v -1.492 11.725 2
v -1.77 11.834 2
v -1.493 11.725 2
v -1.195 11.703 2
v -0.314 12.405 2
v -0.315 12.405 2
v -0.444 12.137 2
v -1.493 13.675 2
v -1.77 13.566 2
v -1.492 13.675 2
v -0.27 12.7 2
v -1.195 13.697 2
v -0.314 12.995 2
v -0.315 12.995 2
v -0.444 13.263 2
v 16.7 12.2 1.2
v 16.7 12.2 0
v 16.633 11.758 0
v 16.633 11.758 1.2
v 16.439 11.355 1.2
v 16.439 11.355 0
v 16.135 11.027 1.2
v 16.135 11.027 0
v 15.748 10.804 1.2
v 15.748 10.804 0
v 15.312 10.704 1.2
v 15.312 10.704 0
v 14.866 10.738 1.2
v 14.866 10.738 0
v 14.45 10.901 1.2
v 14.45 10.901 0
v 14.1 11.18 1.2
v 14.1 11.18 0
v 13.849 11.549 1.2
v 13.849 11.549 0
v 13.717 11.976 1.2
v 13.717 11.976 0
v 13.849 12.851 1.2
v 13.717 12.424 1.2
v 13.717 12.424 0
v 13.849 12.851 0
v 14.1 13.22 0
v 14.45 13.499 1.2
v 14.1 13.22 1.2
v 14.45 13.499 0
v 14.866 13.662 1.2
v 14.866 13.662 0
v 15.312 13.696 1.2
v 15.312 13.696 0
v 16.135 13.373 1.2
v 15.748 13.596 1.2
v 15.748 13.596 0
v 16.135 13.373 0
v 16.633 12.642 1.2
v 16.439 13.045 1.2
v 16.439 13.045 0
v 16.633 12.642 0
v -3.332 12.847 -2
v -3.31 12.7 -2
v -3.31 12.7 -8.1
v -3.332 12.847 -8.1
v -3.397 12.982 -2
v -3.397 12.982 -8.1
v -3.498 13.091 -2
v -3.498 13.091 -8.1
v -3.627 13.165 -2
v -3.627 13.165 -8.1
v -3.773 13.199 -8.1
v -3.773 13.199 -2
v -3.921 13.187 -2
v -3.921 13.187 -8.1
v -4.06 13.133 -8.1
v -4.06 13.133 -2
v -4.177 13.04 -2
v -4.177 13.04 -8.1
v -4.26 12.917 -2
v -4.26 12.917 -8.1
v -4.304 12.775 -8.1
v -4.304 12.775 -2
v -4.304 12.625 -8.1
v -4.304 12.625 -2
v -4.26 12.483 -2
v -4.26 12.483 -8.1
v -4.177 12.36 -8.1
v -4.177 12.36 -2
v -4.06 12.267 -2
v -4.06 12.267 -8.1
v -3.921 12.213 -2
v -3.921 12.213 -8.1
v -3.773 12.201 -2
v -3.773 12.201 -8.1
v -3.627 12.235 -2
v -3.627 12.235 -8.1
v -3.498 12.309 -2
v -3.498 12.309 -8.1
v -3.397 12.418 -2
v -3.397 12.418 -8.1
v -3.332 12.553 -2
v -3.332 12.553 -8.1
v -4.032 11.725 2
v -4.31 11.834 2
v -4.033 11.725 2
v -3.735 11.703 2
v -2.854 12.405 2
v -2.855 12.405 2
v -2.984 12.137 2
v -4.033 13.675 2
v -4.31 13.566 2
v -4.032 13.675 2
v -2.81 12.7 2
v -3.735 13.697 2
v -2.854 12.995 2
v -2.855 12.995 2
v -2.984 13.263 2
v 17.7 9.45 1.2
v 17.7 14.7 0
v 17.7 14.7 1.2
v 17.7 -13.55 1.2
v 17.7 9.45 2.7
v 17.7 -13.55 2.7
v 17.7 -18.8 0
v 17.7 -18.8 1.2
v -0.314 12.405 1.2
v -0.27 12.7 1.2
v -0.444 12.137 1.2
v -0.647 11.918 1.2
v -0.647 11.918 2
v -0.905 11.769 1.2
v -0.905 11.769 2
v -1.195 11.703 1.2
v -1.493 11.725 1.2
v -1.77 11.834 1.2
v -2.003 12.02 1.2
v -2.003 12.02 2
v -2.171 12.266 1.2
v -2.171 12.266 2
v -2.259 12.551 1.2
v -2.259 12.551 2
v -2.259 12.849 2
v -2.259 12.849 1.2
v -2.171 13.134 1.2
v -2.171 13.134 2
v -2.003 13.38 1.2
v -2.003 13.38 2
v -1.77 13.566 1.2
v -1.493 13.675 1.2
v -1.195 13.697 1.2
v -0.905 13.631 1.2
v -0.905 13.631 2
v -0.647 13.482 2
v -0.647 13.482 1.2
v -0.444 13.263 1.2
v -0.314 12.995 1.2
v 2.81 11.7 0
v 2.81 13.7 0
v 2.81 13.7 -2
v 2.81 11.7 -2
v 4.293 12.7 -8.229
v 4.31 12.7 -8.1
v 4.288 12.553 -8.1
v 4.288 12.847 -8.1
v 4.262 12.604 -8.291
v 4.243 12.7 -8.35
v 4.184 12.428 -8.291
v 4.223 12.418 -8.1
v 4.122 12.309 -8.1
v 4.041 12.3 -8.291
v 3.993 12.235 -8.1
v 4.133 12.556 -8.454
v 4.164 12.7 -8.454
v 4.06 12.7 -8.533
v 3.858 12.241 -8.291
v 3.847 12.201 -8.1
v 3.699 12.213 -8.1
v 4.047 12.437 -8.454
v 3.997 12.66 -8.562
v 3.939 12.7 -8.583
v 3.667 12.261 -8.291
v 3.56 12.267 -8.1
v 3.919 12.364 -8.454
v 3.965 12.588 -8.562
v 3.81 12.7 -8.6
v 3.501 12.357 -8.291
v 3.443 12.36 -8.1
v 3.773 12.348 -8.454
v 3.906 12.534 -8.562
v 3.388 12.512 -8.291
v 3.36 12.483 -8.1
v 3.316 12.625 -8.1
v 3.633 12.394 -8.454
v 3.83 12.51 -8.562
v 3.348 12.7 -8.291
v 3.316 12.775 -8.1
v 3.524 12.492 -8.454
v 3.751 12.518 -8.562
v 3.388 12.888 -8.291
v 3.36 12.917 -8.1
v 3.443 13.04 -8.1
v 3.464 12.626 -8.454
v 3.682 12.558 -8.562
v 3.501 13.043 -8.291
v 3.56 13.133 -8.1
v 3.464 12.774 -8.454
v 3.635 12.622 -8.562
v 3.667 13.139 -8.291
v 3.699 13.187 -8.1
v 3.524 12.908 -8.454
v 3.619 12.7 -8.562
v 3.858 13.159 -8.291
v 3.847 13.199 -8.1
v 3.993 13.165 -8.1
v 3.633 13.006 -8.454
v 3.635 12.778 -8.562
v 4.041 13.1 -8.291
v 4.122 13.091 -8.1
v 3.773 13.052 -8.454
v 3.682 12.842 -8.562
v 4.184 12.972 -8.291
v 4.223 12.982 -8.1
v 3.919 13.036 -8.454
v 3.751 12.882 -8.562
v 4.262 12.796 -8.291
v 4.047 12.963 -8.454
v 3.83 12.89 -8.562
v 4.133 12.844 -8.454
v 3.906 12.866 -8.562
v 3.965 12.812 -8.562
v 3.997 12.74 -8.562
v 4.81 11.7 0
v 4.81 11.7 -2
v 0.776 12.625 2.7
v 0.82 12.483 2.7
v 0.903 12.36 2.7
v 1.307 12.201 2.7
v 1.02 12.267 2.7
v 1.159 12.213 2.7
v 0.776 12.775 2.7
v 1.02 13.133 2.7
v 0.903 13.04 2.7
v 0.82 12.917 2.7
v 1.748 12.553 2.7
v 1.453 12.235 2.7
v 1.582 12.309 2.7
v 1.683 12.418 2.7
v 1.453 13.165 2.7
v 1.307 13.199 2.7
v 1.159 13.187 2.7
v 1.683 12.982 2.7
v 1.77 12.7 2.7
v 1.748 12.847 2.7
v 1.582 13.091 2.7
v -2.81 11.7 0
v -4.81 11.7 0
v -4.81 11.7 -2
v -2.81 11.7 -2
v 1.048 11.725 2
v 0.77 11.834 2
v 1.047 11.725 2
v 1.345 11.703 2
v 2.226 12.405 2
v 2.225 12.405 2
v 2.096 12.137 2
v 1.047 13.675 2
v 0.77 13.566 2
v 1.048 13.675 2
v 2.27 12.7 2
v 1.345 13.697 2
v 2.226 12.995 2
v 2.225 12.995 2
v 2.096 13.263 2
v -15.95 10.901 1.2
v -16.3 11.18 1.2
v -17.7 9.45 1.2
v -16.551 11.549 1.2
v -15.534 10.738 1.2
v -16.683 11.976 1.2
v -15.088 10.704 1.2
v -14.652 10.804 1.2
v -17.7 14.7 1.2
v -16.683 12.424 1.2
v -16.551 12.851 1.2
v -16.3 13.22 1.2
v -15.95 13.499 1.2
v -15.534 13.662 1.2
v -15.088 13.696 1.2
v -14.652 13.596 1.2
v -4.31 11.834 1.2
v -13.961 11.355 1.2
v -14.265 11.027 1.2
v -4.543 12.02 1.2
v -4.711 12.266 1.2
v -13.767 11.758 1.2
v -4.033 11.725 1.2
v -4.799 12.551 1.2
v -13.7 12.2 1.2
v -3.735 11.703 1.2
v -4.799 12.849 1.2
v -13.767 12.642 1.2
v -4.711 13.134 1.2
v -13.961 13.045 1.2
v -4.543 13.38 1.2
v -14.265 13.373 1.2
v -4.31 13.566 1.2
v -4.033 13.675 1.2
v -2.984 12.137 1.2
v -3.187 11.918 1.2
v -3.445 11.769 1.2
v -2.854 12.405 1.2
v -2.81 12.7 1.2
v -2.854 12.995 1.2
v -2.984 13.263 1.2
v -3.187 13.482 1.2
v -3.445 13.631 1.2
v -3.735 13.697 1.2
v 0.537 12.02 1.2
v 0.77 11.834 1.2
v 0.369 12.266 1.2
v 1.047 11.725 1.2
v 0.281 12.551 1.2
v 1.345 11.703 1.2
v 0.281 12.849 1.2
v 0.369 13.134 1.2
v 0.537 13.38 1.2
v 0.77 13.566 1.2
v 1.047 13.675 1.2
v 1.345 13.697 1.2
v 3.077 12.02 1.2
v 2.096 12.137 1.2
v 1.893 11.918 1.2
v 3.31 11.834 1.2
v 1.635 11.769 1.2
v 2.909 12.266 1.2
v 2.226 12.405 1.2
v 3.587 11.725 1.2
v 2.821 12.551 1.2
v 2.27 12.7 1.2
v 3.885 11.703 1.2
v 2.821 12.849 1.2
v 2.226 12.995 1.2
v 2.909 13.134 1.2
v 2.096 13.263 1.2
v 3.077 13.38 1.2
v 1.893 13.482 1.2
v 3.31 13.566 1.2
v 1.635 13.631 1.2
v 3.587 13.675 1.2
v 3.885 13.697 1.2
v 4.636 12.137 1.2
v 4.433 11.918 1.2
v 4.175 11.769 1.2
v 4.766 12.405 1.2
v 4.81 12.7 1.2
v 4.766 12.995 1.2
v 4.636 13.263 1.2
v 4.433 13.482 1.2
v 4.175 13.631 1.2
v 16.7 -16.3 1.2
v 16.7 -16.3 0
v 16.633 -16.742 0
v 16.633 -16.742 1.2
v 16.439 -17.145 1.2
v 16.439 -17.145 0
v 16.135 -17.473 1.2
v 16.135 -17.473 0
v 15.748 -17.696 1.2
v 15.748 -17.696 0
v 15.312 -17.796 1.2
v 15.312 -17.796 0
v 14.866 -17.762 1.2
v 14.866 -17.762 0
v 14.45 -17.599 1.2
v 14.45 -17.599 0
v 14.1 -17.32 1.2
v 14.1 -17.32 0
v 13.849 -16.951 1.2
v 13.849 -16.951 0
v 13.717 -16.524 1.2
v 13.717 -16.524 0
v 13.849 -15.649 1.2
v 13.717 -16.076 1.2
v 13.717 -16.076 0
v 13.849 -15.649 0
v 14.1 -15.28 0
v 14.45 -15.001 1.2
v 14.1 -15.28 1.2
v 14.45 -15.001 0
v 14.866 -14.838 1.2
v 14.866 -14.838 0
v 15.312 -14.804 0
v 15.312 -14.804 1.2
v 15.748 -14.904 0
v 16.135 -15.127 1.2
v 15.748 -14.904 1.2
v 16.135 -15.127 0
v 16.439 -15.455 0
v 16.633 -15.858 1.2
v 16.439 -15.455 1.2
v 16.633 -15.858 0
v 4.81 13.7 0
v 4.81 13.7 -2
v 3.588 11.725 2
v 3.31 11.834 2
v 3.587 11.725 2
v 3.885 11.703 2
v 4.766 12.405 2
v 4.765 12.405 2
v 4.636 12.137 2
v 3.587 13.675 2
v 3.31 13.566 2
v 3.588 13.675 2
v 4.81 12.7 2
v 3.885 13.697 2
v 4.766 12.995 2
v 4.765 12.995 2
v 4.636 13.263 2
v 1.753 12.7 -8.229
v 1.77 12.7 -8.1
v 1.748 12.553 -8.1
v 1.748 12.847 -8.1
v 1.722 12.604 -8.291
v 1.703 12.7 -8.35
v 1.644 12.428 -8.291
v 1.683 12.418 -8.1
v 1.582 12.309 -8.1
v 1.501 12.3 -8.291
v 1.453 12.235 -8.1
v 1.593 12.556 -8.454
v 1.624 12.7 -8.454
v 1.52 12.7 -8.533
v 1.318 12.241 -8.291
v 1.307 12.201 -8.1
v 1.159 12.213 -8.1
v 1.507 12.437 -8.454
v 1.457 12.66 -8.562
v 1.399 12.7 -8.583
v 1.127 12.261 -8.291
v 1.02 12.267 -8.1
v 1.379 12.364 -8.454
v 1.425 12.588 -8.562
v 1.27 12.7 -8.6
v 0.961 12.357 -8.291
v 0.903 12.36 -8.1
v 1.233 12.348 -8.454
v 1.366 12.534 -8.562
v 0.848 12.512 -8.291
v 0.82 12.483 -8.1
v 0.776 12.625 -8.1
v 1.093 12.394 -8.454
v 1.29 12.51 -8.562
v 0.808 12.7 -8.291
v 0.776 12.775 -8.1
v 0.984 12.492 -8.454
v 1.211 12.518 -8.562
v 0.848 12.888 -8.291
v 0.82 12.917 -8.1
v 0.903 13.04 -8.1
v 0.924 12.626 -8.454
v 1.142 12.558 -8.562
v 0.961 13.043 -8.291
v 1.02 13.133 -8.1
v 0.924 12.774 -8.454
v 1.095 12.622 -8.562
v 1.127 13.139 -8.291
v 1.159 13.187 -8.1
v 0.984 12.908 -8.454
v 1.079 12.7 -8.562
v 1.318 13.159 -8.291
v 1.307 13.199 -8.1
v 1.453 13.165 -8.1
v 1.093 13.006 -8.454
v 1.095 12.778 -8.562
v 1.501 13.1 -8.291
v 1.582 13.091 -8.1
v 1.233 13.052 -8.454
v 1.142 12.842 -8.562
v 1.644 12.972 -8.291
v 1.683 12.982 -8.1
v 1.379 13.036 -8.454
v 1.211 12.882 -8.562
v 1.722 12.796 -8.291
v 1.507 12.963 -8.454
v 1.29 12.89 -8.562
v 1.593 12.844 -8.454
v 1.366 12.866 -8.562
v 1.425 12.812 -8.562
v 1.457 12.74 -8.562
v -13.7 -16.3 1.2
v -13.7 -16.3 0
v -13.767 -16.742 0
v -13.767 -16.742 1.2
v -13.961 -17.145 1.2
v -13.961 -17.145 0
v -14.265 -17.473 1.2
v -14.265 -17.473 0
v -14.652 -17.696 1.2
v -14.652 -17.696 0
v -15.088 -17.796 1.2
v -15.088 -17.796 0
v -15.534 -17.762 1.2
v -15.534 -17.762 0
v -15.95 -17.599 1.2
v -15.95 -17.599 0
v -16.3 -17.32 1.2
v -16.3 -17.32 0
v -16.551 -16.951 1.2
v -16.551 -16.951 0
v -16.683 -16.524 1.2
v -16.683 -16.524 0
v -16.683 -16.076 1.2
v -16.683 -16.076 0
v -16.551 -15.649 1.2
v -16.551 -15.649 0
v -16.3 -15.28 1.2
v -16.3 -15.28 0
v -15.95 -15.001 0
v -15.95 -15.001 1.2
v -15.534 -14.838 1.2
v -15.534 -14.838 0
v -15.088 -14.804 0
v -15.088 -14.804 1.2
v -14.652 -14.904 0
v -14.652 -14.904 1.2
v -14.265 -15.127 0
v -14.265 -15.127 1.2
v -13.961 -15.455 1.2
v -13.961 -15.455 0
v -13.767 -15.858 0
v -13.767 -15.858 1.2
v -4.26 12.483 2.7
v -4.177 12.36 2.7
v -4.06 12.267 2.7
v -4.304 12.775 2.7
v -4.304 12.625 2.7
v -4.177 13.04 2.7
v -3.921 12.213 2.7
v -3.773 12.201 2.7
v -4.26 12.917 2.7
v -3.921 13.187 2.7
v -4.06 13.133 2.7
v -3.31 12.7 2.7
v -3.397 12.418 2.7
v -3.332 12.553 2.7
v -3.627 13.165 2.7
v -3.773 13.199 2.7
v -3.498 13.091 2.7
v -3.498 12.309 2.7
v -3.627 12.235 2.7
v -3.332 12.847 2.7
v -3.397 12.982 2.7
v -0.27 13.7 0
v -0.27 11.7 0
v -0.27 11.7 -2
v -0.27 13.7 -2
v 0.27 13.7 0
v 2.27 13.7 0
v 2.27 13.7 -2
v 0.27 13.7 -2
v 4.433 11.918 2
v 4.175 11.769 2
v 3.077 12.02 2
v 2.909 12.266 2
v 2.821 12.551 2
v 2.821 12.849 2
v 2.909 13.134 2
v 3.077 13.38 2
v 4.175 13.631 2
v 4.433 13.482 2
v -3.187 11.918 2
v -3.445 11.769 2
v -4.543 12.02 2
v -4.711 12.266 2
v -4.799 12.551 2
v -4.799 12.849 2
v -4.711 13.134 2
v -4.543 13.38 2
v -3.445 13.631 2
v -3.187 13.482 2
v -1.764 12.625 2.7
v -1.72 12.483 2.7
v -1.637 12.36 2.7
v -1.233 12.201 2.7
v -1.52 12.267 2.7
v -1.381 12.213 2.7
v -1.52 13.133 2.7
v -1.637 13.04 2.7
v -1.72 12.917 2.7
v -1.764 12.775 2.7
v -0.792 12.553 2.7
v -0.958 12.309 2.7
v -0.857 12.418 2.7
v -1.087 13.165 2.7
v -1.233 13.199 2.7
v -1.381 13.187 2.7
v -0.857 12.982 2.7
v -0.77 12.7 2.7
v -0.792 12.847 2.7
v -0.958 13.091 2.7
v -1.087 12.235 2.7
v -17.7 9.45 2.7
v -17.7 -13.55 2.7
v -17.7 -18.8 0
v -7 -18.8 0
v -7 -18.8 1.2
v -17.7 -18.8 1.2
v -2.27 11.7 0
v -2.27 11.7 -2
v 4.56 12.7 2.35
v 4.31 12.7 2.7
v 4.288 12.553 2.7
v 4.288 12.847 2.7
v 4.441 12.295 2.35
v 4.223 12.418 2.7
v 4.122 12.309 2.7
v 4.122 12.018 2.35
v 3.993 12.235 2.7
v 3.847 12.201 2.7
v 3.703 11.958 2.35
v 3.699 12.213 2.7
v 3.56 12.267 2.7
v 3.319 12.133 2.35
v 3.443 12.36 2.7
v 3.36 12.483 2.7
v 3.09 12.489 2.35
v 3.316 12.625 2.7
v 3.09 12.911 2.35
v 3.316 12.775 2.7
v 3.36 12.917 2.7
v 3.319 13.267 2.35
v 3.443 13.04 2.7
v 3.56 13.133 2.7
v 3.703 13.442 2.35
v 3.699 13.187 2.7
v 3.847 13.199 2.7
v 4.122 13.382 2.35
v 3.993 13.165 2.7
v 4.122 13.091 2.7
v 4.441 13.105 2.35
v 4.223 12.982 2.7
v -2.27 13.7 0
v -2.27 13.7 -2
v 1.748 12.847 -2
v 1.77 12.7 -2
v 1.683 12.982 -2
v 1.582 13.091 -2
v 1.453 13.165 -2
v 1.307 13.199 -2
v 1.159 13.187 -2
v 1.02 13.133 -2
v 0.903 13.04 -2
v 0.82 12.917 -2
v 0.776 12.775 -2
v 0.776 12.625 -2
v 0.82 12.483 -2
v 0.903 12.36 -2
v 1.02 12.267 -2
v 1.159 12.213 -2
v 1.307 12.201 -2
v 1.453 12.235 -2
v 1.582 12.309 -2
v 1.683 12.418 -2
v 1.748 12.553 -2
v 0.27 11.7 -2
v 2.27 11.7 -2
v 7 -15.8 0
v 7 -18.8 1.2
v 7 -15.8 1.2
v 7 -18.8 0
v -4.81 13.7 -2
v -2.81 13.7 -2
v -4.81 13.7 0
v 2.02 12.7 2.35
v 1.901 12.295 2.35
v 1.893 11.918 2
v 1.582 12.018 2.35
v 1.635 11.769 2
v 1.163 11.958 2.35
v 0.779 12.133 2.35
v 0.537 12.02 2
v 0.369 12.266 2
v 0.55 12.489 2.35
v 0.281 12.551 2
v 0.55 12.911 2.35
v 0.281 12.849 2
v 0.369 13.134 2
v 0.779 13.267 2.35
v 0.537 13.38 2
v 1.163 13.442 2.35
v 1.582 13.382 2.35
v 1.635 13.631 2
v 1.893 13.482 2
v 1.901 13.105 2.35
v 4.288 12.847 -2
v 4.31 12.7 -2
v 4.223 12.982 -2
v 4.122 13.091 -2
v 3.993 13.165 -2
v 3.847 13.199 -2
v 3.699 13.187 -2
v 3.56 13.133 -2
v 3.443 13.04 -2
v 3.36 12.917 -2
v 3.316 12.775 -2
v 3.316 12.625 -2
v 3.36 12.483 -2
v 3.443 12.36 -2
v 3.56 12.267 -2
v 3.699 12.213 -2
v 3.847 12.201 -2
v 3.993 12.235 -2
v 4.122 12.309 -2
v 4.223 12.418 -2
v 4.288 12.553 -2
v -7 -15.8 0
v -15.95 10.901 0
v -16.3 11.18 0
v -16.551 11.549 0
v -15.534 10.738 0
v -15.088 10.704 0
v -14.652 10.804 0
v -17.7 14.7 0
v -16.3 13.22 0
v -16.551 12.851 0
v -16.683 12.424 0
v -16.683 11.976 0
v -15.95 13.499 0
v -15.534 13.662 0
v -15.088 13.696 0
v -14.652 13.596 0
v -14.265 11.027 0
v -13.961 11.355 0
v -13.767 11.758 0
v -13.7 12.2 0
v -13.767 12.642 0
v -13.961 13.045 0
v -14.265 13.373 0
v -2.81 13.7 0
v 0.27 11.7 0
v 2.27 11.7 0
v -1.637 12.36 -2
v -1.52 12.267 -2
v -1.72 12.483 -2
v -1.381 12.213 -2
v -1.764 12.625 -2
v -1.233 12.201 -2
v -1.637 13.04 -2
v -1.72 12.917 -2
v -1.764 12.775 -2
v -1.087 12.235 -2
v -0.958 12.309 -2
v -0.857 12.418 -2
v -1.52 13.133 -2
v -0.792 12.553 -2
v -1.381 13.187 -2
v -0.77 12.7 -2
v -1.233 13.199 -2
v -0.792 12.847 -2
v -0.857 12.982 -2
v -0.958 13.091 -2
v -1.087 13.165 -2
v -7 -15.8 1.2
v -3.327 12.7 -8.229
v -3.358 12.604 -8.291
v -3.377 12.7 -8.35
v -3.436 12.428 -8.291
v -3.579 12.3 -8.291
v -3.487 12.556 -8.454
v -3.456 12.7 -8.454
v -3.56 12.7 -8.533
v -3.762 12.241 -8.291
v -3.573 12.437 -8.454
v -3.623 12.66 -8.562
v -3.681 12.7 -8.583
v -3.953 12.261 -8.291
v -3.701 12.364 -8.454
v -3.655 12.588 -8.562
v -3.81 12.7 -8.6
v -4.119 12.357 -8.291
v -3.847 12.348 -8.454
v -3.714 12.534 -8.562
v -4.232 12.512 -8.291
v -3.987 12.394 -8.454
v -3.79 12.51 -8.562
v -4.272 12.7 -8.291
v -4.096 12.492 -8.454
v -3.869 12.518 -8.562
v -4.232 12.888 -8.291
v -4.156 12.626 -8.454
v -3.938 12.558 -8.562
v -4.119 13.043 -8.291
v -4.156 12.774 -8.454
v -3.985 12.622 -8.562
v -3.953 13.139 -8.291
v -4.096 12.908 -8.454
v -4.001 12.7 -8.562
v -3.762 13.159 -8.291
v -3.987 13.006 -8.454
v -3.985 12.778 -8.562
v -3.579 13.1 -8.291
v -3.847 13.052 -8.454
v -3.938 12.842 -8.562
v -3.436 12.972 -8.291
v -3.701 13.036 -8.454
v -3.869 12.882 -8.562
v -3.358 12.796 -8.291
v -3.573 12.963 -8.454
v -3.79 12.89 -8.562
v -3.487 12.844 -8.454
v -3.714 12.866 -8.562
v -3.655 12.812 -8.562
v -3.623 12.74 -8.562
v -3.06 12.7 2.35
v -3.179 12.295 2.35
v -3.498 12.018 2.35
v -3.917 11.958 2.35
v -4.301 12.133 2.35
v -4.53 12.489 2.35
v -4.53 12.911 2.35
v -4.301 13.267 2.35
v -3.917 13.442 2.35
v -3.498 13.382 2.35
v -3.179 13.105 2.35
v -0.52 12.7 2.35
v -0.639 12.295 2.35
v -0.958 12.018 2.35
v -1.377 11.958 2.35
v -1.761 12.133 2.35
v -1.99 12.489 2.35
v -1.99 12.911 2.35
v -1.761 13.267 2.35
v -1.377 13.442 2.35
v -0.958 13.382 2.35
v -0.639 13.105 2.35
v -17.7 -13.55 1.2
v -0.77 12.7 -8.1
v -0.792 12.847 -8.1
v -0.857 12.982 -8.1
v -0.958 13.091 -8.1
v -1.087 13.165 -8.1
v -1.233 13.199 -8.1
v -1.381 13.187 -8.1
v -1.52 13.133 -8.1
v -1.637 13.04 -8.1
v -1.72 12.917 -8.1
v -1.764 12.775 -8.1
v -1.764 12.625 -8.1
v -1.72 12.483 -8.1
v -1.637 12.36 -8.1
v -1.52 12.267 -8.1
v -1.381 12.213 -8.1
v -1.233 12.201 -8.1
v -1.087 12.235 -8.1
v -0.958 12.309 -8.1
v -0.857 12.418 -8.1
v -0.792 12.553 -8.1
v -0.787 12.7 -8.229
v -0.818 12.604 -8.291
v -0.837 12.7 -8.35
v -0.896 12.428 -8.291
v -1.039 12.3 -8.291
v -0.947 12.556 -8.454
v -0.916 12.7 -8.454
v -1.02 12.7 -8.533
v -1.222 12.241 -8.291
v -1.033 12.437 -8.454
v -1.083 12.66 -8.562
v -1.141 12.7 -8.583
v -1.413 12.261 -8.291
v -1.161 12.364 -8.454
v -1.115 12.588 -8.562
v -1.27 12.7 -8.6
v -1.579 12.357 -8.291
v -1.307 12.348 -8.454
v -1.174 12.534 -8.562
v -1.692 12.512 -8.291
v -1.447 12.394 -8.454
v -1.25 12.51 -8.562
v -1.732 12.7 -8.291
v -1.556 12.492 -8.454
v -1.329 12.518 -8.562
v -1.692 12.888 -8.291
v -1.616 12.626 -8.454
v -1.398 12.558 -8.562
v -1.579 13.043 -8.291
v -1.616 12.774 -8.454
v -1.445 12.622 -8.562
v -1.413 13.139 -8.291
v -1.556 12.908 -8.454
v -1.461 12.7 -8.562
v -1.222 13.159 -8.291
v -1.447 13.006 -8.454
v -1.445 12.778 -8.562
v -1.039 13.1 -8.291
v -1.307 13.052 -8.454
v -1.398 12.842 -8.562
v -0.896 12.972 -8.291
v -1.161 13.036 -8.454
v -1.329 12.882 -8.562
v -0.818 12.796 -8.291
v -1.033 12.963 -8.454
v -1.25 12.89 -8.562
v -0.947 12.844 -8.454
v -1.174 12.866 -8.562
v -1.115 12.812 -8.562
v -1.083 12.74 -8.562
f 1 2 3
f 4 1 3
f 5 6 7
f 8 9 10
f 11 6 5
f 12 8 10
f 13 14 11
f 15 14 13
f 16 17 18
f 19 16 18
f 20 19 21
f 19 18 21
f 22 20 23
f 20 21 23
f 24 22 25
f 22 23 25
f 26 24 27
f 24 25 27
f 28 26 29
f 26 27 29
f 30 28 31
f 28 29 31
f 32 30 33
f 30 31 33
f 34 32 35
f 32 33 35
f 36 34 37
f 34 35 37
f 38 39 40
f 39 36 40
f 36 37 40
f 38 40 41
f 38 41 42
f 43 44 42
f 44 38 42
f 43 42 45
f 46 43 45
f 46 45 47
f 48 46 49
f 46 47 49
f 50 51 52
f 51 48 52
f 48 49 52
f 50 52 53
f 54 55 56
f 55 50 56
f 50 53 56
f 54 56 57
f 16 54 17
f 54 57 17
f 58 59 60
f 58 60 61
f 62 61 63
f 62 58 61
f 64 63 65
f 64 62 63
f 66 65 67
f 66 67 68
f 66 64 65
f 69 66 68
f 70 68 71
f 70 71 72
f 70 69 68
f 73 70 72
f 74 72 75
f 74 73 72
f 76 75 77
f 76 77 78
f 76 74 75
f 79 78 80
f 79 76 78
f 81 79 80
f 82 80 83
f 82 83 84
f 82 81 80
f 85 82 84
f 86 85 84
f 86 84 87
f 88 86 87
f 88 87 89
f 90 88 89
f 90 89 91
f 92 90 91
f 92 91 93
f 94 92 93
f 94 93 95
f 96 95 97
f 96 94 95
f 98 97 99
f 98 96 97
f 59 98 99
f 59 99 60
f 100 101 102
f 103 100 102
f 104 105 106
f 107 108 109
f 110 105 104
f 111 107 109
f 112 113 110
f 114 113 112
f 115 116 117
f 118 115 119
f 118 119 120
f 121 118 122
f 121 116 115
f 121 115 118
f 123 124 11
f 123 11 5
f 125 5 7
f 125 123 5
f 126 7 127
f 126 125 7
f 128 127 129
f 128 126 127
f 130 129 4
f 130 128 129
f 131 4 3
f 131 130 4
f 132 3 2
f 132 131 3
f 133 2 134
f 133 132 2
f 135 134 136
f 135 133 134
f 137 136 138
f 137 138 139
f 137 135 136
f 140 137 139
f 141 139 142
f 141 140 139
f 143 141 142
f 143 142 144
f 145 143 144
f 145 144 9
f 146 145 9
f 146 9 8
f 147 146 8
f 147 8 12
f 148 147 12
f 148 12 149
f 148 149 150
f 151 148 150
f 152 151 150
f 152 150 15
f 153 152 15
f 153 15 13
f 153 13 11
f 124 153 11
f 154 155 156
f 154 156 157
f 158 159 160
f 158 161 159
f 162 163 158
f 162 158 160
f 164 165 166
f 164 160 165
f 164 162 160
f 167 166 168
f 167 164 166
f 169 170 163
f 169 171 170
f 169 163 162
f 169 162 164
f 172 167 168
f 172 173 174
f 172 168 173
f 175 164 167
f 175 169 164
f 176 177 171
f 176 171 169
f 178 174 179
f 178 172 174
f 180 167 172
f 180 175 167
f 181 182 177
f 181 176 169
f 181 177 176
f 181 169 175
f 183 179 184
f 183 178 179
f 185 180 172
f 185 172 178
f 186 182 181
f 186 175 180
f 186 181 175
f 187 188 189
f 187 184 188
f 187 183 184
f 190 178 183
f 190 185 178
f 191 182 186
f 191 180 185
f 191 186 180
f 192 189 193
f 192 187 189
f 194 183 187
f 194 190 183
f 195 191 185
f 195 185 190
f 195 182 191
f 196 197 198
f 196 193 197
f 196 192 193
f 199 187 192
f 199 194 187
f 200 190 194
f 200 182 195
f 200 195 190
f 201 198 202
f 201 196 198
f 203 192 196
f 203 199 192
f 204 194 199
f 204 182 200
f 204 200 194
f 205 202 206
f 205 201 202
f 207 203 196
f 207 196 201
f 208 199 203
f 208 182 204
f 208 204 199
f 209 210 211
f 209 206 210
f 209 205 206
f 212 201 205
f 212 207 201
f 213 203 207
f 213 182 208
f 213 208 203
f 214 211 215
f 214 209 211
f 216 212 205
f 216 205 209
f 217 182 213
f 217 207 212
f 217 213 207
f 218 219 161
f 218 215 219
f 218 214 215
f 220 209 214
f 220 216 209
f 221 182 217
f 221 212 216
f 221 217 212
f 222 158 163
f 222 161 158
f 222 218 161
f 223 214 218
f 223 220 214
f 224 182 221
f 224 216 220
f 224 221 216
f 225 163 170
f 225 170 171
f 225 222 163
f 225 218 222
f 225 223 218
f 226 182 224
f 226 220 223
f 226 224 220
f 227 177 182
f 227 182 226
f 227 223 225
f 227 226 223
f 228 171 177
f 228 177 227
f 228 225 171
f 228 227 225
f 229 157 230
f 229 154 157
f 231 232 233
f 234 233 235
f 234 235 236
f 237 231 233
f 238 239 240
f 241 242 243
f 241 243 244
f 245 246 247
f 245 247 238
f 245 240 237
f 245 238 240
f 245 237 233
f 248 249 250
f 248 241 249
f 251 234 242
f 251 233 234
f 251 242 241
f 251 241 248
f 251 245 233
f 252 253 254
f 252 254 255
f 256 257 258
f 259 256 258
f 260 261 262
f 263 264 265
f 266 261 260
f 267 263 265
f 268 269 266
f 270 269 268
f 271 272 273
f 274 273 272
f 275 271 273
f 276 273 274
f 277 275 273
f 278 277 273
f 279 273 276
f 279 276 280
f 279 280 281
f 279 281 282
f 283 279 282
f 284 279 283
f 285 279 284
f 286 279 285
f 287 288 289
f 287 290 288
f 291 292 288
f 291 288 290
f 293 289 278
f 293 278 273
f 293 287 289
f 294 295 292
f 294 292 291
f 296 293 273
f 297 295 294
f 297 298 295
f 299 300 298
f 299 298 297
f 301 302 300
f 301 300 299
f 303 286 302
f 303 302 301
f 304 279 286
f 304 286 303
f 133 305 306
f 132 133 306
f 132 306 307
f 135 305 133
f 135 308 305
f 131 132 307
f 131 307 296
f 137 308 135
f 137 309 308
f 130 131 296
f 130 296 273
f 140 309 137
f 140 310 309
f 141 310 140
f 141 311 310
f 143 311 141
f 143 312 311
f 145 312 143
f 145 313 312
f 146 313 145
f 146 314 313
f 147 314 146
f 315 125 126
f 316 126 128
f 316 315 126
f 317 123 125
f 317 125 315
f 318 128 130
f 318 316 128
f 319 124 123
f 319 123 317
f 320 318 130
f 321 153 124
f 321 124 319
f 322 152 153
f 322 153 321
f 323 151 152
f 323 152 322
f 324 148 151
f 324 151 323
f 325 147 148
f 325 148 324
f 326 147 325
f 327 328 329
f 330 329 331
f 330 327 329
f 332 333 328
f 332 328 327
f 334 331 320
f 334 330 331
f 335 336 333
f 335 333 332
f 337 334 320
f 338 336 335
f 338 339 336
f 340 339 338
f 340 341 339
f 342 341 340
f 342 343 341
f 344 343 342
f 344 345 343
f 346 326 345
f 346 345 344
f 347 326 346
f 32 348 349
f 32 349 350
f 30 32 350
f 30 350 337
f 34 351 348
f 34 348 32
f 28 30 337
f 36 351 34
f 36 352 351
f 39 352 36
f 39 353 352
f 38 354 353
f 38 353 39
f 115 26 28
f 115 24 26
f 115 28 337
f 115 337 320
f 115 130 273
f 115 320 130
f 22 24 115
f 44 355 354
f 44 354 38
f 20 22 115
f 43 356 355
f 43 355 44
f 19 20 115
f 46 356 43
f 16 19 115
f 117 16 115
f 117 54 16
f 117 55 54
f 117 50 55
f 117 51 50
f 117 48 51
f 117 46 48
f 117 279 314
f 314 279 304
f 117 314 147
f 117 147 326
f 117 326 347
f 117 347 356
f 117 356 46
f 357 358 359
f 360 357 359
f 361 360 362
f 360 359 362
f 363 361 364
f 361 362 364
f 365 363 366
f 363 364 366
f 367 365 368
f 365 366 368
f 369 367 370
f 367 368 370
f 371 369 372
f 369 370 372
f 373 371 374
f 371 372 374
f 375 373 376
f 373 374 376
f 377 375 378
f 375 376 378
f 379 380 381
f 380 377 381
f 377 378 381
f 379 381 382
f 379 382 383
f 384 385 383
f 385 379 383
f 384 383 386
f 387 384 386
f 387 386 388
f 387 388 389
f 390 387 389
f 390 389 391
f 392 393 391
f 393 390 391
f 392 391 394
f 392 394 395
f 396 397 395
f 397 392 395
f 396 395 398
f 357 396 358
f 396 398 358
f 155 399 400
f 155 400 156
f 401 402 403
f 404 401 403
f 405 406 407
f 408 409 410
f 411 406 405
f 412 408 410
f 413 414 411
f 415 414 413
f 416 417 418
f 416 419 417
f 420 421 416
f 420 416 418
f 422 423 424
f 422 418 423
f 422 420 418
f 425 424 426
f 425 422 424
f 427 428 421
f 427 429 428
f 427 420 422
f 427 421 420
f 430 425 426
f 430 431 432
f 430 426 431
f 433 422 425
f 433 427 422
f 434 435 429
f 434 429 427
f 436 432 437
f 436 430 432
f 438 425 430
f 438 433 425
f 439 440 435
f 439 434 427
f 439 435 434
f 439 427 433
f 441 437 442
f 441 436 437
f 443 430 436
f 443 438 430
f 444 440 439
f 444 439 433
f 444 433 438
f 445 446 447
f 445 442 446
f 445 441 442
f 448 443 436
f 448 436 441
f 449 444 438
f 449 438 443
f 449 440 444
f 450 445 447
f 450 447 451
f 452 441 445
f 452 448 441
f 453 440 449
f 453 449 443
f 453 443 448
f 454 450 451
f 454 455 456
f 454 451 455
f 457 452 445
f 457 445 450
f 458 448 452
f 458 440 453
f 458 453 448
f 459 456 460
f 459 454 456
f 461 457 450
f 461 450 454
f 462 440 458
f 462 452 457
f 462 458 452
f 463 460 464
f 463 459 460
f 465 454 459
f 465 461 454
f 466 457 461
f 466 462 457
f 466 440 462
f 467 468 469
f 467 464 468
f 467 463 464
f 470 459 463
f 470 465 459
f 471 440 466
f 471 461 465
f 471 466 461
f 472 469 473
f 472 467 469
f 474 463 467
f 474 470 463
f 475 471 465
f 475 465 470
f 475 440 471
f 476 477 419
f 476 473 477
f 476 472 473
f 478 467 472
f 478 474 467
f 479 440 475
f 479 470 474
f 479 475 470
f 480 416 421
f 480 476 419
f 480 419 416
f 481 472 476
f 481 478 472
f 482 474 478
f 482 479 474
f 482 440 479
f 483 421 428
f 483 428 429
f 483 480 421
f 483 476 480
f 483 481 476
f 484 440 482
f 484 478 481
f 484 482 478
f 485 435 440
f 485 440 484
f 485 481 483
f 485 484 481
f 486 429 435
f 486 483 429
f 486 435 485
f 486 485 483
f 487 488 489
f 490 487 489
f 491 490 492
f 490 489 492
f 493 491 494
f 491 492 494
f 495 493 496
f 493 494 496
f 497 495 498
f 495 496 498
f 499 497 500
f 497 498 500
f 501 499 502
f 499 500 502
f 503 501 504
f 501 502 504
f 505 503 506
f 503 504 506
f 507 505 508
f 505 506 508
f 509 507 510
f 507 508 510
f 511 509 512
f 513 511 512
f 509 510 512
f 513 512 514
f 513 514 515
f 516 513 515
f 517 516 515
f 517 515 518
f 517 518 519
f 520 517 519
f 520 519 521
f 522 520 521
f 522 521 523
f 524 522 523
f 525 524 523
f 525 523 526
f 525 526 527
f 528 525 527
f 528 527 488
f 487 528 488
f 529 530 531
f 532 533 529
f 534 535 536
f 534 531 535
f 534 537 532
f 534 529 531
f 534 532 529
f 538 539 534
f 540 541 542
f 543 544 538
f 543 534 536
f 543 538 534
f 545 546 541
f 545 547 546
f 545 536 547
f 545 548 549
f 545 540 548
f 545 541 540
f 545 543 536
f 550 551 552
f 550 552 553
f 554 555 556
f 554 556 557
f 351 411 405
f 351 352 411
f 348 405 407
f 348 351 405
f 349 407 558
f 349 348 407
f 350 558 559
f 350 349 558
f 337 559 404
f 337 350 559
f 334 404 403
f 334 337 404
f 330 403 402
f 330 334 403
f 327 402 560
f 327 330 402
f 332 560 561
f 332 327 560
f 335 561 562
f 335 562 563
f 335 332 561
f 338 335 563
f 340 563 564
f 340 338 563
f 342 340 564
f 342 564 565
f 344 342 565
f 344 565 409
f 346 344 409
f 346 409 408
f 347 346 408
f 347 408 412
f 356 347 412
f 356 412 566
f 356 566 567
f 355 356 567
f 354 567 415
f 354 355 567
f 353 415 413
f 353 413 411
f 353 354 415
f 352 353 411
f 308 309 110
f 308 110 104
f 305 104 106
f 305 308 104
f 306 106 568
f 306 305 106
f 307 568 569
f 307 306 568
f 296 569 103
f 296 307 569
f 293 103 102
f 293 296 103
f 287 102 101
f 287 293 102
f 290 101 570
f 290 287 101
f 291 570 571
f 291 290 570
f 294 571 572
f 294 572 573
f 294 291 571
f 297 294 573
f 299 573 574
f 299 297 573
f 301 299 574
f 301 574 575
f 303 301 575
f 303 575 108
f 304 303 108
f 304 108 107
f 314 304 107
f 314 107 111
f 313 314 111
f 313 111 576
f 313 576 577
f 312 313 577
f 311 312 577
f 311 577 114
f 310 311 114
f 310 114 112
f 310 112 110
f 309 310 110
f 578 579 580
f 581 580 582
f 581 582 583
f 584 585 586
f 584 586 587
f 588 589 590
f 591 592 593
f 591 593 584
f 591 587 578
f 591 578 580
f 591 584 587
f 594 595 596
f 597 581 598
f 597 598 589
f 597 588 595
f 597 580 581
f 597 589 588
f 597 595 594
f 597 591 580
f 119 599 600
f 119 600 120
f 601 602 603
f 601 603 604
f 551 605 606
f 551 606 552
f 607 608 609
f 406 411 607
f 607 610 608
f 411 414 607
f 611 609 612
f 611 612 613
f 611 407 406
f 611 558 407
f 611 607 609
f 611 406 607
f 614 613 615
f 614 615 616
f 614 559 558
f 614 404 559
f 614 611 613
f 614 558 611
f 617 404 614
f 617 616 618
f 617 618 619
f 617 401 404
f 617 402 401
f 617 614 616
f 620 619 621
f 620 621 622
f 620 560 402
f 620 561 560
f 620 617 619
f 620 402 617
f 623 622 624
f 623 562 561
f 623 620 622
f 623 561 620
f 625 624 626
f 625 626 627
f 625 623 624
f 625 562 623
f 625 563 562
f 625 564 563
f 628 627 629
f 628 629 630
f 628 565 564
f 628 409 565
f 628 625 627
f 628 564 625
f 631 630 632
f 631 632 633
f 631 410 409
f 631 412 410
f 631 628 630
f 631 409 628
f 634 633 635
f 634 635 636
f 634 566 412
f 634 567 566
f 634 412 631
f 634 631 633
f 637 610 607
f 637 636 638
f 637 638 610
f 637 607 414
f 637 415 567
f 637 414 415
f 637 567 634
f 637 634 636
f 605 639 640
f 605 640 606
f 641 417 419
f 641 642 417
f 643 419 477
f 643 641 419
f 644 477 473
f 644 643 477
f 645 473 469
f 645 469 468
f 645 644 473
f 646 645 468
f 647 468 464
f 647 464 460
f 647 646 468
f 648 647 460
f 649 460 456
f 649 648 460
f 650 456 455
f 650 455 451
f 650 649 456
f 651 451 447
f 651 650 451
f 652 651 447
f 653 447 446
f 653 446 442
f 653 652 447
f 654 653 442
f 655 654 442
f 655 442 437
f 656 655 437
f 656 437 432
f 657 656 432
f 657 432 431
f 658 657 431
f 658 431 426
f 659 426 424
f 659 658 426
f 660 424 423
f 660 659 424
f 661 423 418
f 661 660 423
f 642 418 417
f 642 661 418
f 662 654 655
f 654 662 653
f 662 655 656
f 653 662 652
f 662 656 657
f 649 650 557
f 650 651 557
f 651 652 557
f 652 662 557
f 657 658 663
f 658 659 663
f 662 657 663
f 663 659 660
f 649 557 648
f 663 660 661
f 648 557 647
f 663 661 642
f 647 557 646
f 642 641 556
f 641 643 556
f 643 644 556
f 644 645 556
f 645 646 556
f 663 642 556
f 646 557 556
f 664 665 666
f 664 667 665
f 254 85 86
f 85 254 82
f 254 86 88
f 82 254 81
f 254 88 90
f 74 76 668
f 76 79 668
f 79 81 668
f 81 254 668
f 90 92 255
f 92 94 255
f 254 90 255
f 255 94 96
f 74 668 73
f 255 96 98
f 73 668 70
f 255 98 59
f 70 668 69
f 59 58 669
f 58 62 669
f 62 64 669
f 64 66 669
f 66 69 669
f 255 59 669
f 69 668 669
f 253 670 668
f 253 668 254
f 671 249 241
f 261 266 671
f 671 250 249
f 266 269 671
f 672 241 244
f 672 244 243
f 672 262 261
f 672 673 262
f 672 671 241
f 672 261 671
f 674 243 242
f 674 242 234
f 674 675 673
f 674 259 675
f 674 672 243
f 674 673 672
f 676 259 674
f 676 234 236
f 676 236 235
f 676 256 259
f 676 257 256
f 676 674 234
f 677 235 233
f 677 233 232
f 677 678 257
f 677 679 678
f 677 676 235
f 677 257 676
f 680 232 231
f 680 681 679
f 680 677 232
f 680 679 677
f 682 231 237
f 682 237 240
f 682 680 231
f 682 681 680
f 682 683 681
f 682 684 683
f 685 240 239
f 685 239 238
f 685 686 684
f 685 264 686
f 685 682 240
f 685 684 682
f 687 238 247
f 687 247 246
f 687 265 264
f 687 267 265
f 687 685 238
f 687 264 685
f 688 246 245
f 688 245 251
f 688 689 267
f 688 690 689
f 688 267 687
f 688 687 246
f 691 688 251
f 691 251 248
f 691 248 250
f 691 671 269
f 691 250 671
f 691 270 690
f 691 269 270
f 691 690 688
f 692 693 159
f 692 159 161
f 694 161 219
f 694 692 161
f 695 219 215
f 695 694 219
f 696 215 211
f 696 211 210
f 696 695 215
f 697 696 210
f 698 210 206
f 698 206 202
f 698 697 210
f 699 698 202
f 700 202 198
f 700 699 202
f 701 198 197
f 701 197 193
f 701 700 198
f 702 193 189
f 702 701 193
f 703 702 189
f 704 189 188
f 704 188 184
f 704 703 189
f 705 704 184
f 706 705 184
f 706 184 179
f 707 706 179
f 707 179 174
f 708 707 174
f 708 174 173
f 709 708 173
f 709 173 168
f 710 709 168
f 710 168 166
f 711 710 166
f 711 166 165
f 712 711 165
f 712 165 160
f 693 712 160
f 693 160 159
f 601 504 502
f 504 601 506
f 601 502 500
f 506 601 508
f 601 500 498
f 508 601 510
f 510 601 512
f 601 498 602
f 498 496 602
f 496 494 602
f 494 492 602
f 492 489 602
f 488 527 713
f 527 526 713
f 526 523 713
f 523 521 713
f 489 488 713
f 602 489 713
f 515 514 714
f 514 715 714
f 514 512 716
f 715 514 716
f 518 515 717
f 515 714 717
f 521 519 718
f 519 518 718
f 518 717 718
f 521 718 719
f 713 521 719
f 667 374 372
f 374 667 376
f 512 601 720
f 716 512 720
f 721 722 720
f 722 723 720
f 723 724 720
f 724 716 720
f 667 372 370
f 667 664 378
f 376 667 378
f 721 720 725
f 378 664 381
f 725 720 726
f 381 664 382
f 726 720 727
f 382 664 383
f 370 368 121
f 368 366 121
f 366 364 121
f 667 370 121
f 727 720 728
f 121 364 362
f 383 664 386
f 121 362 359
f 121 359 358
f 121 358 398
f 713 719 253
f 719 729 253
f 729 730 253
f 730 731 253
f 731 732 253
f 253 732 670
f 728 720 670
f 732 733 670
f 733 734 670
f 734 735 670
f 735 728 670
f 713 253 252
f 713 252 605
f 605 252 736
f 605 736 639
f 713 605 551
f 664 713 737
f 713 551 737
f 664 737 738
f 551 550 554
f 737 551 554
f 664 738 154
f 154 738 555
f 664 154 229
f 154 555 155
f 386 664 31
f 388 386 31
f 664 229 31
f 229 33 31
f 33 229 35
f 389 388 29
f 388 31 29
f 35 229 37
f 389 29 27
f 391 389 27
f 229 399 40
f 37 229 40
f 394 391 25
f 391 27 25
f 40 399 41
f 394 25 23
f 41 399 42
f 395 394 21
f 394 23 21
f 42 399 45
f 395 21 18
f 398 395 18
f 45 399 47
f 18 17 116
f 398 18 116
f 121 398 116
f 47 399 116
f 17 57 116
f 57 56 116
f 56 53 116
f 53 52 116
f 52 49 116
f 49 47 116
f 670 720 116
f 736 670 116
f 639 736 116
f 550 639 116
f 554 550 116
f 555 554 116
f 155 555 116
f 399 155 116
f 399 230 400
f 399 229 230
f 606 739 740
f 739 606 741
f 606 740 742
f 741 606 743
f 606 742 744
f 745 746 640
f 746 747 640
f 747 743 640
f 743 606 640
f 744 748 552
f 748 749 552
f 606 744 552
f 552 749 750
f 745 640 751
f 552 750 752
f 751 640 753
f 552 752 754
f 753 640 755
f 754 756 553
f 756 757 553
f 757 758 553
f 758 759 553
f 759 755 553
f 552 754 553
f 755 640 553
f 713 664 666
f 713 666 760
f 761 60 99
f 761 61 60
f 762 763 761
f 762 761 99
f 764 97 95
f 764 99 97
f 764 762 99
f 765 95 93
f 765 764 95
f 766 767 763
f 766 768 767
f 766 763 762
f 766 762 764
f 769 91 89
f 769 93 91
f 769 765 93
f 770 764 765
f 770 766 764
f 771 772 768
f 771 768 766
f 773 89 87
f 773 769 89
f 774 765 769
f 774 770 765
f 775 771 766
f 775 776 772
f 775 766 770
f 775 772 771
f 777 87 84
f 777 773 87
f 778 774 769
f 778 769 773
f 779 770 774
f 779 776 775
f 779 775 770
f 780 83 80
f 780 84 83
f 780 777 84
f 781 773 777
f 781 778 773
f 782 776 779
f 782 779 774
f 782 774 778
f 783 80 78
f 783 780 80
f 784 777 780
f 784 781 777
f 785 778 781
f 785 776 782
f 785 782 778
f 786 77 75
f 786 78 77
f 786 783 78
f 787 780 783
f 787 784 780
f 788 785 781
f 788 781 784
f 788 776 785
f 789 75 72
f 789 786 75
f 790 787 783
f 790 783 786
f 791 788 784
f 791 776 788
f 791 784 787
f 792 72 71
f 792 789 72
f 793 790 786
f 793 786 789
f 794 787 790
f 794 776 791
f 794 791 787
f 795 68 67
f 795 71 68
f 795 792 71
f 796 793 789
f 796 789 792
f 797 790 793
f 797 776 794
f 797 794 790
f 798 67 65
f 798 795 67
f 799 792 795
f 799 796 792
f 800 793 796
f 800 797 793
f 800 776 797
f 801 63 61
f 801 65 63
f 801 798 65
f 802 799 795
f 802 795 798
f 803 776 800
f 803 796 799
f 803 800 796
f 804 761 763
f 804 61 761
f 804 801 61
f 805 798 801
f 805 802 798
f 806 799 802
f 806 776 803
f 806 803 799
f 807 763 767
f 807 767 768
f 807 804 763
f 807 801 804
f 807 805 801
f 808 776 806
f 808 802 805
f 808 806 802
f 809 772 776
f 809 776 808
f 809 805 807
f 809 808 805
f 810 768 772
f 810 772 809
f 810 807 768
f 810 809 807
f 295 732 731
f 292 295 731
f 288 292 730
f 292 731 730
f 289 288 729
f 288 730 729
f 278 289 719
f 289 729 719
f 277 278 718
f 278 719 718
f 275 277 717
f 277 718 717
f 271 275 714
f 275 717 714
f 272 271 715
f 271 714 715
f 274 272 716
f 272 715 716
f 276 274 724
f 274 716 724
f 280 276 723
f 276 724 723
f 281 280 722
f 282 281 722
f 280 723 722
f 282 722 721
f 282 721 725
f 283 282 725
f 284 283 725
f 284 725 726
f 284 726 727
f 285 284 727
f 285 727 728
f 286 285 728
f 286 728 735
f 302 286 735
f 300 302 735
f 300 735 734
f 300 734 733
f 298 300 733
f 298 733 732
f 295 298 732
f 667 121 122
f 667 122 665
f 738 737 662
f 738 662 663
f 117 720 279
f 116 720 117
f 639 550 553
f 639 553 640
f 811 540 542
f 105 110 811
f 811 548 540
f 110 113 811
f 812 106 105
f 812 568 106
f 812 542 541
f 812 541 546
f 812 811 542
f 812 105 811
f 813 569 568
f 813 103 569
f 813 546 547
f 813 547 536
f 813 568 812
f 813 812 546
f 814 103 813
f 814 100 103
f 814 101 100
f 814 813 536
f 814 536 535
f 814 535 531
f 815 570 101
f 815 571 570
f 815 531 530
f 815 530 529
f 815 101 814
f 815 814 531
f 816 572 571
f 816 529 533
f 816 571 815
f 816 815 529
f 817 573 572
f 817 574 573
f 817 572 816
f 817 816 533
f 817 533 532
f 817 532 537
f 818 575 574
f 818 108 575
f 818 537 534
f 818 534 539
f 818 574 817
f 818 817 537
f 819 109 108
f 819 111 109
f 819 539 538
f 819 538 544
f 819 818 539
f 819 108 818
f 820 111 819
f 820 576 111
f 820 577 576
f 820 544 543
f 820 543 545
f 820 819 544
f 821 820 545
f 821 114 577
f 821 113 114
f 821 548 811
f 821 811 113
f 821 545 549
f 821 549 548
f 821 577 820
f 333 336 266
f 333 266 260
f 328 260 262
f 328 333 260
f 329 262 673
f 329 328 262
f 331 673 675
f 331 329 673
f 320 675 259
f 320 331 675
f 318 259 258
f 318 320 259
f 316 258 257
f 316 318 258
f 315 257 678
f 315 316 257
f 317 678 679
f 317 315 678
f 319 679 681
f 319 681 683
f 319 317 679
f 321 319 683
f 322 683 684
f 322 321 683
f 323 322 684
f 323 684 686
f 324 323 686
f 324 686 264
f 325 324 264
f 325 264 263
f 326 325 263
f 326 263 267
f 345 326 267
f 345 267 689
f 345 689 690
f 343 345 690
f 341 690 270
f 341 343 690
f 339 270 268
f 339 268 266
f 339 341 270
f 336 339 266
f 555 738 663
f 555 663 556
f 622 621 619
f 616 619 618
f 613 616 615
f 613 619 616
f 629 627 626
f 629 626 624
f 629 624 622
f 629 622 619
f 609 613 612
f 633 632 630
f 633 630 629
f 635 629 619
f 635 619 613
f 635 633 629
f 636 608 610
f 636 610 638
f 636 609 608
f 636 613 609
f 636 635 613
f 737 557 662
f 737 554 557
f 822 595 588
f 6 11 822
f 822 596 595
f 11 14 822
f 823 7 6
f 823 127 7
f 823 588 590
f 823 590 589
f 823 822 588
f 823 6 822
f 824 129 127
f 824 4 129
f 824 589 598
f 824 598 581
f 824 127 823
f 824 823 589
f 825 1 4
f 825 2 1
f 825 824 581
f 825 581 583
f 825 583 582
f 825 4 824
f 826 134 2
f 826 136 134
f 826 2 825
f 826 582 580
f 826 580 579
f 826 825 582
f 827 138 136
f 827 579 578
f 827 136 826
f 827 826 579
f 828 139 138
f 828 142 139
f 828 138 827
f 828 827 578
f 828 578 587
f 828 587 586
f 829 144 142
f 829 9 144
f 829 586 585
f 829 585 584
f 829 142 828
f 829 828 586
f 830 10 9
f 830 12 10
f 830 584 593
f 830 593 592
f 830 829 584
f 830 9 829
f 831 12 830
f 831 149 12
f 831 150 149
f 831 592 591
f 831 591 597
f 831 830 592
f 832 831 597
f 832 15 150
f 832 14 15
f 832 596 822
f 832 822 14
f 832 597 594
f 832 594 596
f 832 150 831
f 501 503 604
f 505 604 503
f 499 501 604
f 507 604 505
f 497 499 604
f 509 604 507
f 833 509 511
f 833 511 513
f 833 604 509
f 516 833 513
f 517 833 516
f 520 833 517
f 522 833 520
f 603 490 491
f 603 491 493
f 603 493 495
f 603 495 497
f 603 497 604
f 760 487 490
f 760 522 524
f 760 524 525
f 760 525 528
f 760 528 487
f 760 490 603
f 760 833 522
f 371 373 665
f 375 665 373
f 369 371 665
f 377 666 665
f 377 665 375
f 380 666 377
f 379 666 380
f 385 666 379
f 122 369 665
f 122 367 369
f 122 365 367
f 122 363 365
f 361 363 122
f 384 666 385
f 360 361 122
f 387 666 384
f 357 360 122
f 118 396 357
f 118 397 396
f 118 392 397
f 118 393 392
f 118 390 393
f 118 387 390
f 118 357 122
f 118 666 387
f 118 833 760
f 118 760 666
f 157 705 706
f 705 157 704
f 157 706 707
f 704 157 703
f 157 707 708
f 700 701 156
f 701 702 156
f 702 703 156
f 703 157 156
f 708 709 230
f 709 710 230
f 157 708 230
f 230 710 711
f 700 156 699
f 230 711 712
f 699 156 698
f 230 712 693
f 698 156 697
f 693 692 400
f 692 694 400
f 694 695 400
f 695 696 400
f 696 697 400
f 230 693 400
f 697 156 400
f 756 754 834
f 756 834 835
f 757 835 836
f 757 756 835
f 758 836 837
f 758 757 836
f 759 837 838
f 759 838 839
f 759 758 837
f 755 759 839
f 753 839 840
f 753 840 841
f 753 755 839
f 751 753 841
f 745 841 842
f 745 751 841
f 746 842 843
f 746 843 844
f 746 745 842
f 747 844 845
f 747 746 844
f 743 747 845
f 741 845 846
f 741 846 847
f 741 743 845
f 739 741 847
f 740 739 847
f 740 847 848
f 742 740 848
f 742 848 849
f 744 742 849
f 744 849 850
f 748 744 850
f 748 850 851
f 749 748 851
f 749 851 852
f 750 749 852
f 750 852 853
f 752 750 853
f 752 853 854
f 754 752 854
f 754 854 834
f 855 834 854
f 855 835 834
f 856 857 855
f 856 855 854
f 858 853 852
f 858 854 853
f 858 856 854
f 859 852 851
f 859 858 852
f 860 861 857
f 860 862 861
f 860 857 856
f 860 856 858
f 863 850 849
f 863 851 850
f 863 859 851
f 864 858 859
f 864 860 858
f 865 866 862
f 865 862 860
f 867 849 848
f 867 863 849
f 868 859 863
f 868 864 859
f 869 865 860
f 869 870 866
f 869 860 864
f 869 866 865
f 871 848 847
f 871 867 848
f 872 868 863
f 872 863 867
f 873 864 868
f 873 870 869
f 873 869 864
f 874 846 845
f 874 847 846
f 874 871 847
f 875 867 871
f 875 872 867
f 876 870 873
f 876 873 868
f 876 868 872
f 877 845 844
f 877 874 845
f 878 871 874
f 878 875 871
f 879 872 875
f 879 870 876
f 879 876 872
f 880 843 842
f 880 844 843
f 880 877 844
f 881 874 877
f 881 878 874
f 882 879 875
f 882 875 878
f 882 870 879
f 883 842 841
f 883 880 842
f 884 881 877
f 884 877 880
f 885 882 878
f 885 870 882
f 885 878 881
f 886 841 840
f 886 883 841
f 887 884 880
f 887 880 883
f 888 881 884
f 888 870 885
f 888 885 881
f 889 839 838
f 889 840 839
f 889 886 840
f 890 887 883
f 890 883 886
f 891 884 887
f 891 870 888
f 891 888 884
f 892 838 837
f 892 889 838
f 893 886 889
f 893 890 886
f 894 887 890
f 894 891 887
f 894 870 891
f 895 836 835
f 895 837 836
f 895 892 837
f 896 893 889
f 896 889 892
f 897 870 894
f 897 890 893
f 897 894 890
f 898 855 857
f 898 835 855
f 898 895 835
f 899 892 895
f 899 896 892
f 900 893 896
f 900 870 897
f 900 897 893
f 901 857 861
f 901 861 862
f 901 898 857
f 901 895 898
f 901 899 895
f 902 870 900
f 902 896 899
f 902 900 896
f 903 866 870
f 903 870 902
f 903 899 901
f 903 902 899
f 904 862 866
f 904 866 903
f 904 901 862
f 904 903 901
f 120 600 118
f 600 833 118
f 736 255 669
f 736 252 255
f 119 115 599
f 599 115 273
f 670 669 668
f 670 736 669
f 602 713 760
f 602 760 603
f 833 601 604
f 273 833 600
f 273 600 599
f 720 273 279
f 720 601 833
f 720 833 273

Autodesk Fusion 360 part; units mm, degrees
sketch "Sketch1" plane through (0, 0, 0) normal (0, 0, 1) x (1, 0, 0)
  line L0 (14.71, 7.35) -> (-14.71, 7.35)
  line L1 (-14.71, 7.35) -> (-14.71, -7.35)
  line L2 (-14.71, -7.35) -> (14.71, -7.35)
  line L3 (14.71, -7.35) -> (14.71, 7.35)
  line L4 (14.71, 7.35) -> (-14.71, -7.35) construction
  line L5 (-14.71, 7.35) -> (14.71, -7.35) construction
  line L6 (-17.7, 7.35) -> (-17.7, 14.7)
  line L7 (-17.7, 14.7) -> (-14.71, 14.7)
  line L8 (-17.7, 14.7) -> (17.7, 14.7)
  line L9 (17.7, 14.7) -> (17.7, -18.8)
  line L10 (17.7, -18.8) -> (-17.7, -18.8)
  line L11 (-17.7, -18.8) -> (-17.7, 14.7)
  line L12 (-17.7, 14.7) -> (6.5694, 14.7)
  line L13 (6.5694, 9.45) -> (-14.71, 9.45)
  line L14 (-17.7, 9.45) -> (-17.7, 14.7)
  line L15 (17.7, 9.45) -> (-17.7, 9.45)
  line L16 (-17.7, 9.45) -> (-17.7, -13.55)
  line L17 (-17.7, -13.55) -> (17.7, -13.55)
  line L18 (17.7, -13.55) -> (17.7, 9.45)
  line L19 (-17.7, 14.7) -> (-15.2, 14.7)
  line L20 (-15.2, 14.7) -> (-15.2, 12.2)
  line L21 (-15.2, 12.2) -> (-17.7, 12.2)
  line L22 (-17.7, 12.2) -> (-17.7, 14.7)
  circle A0 centre (-15.2, 12.2) radius 1.5
  circle A1 centre (15.2, 12.2) radius 1.5
  circle A2 centre (-15.2, -16.3) radius 1.5
  circle A3 centre (15.2, -16.3) radius 1.5
  line L23 (-17.7, -18.8) -> (-7, -18.8)
  line L24 (-7, -18.8) -> (-7, -17.6734)
  line L25 (-7, -17.6734) -> (-17.7, -17.6734)
  line L26 (-17.7, -17.6734) -> (-17.7, -18.8)
  line L27 (-7, -18.8) -> (7, -18.8)
  line L28 (7, -18.8) -> (7, -15.8)
  line L29 (7, -15.8) -> (-7, -15.8)
  line L30 (-7, -15.8) -> (-7, -18.8)
  line L31 (-17.7, 14.7) -> (-3.81, 14.7)
  line L32 (-3.81, 14.7) -> (-3.81, 12.7)
  line L33 (-3.81, 12.7) -> (-17.7, 12.7)
  line L34 (-17.7, 12.7) -> (-17.7, 14.7)
  circle A4 centre (-3.81, 12.7) radius 1
  circle A5 centre (-3.81, 12.7) radius 1
  circle A6 centre (-3.81, 12.7) radius 1
  circle A7 centre (-1.27, 12.7) radius 1
  circle A8 centre (1.27, 12.7) radius 1
  circle A9 centre (3.81, 12.7) radius 1
  circle A10 centre (-3.81, 12.7) radius 0.5
  circle A11 centre (-1.27, 12.7) radius 0.5
  circle A12 centre (1.27, 12.7) radius 0.5
  circle A13 centre (3.81, 12.7) radius 0.5
  line L35 (-2.81, 13.7) -> (-4.81, 13.7)
  line L36 (-4.81, 13.7) -> (-4.81, 11.7)
  line L37 (-4.81, 11.7) -> (-2.81, 11.7)
  line L38 (-2.81, 11.7) -> (-2.81, 13.7)
  line L39 (-2.81, 13.7) -> (-4.81, 11.7) construction
  line L40 (-4.81, 13.7) -> (-2.81, 11.7) construction
  line L41 (-0.27, 13.7) -> (-2.27, 13.7)
  line L42 (-2.27, 13.7) -> (-2.27, 11.7)
  line L43 (-2.27, 11.7) -> (-0.27, 11.7)
  line L44 (-0.27, 11.7) -> (-0.27, 13.7)
  line L45 (-0.27, 13.7) -> (-2.27, 11.7) construction
  line L46 (-2.27, 13.7) -> (-0.27, 11.7) construction
  line L47 (2.27, 13.7) -> (0.27, 13.7)
  line L48 (0.27, 13.7) -> (0.27, 11.7)
  line L49 (0.27, 11.7) -> (2.27, 11.7)
  line L50 (2.27, 11.7) -> (2.27, 13.7)
  line L51 (2.27, 13.7) -> (0.27, 11.7) construction
  line L52 (0.27, 13.7) -> (2.27, 11.7) construction
  line L53 (4.81, 13.7) -> (2.81, 13.7)
  line L54 (2.81, 13.7) -> (2.81, 11.7)
  line L55 (2.81, 11.7) -> (4.81, 11.7)
  line L56 (4.81, 11.7) -> (4.81, 13.7)
  line L57 (4.81, 13.7) -> (2.81, 11.7) construction
  line L58 (2.81, 13.7) -> (4.81, 11.7) construction
  point P0 (-3.81, 12.7)
  point P1 (-1.27, 12.7)
  point P2 (1.27, 12.7)
  point P3 (3.81, 12.7)
  dimension "d1" = 29.42
  dimension "d2" = 14.7
  dimension "d3" = 2.99
  dimension "d5" = 35.4
  dimension "d6" = 33.5
  dimension "d7" = 5.25
  dimension "d8" = 23
  dimension "d9" = 2.5
  dimension "d10" = 2.5
  dimension "d11" = 3
  dimension "d12" = 3
  dimension "d13" = 3
  dimension "d14" = 3
  dimension "d19" = 10.7
  dimension "d20" = 14
  dimension "d21" = 3
  dimension "d24" = 13.89
  dimension "d25" = 2
  dimension "d26" = 2
  dimension "d27" = 2
  dimension "d28" = 2
  dimension "d29" = 2
  dimension "d30" = 2
  dimension "d31" = 2
  dimension "d34" = 1
  dimension "d35" = 1
  dimension "d36" = 1
  dimension "d37" = 1
  dimension "d42" = 2
  dimension "d43" = 2
  dimension "d44" = 2
  dimension "d45" = 2
  dimension "d46" = 2
  dimension "d47" = 2
  dimension "d48" = 2
  dimension "d49" = 2
extrude "Extrude1" add sketch "Sketch1" along normal blind 1.2 contours L0 L1 L2 L3 | L6 L9 L11 L13 L15 L16 L17 L18 | L6 L8 L9 L11 L12 L13 L14 L15 L21 A0 L32 L33 L35 L36 L37 L38 | L9 L10 L11 L17 A2 L25 L28 L29 L30 | L6 L11 L14 L21 L22 A0 L33 | L10 L11 A2 L23 L24 L25 L26 L30 | L6 L7 L8 L11 L12 L14 L19 L20 L22 A0 L31 L33 L34 | L10 L24 L27 L28 L29 L30 | L7 L8 L12 L20 A0 L31 L32 L33 L35 L36 | L32 L33 A4 A5 A6 A10 | A4 A5 A6 L35 L36 | L32 L33 A4 A5 A6 A10 | A4 A5 A6 L36 L37 | L32 L33 A10 | L32 L33 A10 | A4 A5 A6 L35 L38 | A4 A5 A6 L37 L38 | A7 | A7 L43 L44 | A7 L41 L44 | A7 L41 L42 | A7 L42 L43 | A8 | A8 L49 L50 | A8 L47 L50 | A8 L47 L48 | A8 L48 L49 | A9 | A9 L55 L56 | A9 L53 L56 | A9 L53 L54 | A9 L54 L55 | A11 | A12 | A13 makes body 1
extrude "Extrude2" add sketch "Sketch1" along normal blind 2.7 contours L0 L1 L2 L3 | L6 L9 L11 L13 L15 L16 L17 L18 bodies 1
extrude "Extrude3" cut sketch "Sketch1" along normal blind 1.2 contours L10 L24 L27 L28 L29 L30 bodies 1
extrude "Extrude4" add sketch "Sketch1" along normal blind 2 separate body contours L32 L33 A4 A5 A6 A10 | L32 L33 A4 A5 A6 A10 | L32 L33 A10 | L32 L33 A10 | A7 | A8 | A9 | A11 | A12 | A13 makes body 2 at (-0.2712, 12.6502, 0.6667) makes body 3 at (2.2688, 12.6502, 0.6667) makes body 4 at (-2.8112, 12.6502, 0.6667) makes body 5 at (4.805, 12.7996, 1.3333)
extrude "Extrude5" add sketch "Sketch1" along normal blind 2.7 contours L32 L33 A10 | L32 L33 A10 | A11 | A12 | A13 bodies 1 2 3 4 5
chamfer "Chamfer1" distance 0.7 distance2 0.5 4 edges at (3.3438, 12.5192, 2) (0.8038, 12.5192, 2) (-1.7362, 12.5192, 2) (-4.2762, 12.5192, 2) measured on face at (4.3075, 12.7498, 2.2333) measured on face at (1.7675, 12.7498, 2.2333) measured on face at (-0.7725, 12.7498, 2.2333) measured on face at (-3.3125, 12.7498, 2.4667) on bodies 1
extrude "Extrude6" add sketch "Sketch1" against normal blind 2 contours L32 L33 A4 A5 A6 A10 | A4 A5 A6 L35 L36 | L32 L33 A4 A5 A6 A10 | A4 A5 A6 L36 L37 | L32 L33 A10 | L32 L33 A10 | A4 A5 A6 L35 L38 | A4 A5 A6 L37 L38 | A7 | A7 L43 L44 | A7 L41 L44 | A7 L41 L42 | A7 L42 L43 | A8 | A8 L49 L50 | A8 L47 L50 | A8 L47 L48 | A8 L48 L49 | A9 | A9 L55 L56 | A9 L53 L56 | A9 L53 L54 | A9 L54 L55 | A11 | A12 | A13 bodies 1
extrude "Extrude7" add sketch "Sketch1" against normal blind 8.6 contours L32 L33 A10 | L32 L33 A10 | A11 | A12 | A13 bodies 1
fillet "Fillet1" radius 0.5 4 edges at (3.3438, 12.8808, -8.6) (0.8038, 12.8808, -8.6) (-1.7362, 12.8808, -8.6) (-4.2762, 12.8808, -8.6) on bodies 1
